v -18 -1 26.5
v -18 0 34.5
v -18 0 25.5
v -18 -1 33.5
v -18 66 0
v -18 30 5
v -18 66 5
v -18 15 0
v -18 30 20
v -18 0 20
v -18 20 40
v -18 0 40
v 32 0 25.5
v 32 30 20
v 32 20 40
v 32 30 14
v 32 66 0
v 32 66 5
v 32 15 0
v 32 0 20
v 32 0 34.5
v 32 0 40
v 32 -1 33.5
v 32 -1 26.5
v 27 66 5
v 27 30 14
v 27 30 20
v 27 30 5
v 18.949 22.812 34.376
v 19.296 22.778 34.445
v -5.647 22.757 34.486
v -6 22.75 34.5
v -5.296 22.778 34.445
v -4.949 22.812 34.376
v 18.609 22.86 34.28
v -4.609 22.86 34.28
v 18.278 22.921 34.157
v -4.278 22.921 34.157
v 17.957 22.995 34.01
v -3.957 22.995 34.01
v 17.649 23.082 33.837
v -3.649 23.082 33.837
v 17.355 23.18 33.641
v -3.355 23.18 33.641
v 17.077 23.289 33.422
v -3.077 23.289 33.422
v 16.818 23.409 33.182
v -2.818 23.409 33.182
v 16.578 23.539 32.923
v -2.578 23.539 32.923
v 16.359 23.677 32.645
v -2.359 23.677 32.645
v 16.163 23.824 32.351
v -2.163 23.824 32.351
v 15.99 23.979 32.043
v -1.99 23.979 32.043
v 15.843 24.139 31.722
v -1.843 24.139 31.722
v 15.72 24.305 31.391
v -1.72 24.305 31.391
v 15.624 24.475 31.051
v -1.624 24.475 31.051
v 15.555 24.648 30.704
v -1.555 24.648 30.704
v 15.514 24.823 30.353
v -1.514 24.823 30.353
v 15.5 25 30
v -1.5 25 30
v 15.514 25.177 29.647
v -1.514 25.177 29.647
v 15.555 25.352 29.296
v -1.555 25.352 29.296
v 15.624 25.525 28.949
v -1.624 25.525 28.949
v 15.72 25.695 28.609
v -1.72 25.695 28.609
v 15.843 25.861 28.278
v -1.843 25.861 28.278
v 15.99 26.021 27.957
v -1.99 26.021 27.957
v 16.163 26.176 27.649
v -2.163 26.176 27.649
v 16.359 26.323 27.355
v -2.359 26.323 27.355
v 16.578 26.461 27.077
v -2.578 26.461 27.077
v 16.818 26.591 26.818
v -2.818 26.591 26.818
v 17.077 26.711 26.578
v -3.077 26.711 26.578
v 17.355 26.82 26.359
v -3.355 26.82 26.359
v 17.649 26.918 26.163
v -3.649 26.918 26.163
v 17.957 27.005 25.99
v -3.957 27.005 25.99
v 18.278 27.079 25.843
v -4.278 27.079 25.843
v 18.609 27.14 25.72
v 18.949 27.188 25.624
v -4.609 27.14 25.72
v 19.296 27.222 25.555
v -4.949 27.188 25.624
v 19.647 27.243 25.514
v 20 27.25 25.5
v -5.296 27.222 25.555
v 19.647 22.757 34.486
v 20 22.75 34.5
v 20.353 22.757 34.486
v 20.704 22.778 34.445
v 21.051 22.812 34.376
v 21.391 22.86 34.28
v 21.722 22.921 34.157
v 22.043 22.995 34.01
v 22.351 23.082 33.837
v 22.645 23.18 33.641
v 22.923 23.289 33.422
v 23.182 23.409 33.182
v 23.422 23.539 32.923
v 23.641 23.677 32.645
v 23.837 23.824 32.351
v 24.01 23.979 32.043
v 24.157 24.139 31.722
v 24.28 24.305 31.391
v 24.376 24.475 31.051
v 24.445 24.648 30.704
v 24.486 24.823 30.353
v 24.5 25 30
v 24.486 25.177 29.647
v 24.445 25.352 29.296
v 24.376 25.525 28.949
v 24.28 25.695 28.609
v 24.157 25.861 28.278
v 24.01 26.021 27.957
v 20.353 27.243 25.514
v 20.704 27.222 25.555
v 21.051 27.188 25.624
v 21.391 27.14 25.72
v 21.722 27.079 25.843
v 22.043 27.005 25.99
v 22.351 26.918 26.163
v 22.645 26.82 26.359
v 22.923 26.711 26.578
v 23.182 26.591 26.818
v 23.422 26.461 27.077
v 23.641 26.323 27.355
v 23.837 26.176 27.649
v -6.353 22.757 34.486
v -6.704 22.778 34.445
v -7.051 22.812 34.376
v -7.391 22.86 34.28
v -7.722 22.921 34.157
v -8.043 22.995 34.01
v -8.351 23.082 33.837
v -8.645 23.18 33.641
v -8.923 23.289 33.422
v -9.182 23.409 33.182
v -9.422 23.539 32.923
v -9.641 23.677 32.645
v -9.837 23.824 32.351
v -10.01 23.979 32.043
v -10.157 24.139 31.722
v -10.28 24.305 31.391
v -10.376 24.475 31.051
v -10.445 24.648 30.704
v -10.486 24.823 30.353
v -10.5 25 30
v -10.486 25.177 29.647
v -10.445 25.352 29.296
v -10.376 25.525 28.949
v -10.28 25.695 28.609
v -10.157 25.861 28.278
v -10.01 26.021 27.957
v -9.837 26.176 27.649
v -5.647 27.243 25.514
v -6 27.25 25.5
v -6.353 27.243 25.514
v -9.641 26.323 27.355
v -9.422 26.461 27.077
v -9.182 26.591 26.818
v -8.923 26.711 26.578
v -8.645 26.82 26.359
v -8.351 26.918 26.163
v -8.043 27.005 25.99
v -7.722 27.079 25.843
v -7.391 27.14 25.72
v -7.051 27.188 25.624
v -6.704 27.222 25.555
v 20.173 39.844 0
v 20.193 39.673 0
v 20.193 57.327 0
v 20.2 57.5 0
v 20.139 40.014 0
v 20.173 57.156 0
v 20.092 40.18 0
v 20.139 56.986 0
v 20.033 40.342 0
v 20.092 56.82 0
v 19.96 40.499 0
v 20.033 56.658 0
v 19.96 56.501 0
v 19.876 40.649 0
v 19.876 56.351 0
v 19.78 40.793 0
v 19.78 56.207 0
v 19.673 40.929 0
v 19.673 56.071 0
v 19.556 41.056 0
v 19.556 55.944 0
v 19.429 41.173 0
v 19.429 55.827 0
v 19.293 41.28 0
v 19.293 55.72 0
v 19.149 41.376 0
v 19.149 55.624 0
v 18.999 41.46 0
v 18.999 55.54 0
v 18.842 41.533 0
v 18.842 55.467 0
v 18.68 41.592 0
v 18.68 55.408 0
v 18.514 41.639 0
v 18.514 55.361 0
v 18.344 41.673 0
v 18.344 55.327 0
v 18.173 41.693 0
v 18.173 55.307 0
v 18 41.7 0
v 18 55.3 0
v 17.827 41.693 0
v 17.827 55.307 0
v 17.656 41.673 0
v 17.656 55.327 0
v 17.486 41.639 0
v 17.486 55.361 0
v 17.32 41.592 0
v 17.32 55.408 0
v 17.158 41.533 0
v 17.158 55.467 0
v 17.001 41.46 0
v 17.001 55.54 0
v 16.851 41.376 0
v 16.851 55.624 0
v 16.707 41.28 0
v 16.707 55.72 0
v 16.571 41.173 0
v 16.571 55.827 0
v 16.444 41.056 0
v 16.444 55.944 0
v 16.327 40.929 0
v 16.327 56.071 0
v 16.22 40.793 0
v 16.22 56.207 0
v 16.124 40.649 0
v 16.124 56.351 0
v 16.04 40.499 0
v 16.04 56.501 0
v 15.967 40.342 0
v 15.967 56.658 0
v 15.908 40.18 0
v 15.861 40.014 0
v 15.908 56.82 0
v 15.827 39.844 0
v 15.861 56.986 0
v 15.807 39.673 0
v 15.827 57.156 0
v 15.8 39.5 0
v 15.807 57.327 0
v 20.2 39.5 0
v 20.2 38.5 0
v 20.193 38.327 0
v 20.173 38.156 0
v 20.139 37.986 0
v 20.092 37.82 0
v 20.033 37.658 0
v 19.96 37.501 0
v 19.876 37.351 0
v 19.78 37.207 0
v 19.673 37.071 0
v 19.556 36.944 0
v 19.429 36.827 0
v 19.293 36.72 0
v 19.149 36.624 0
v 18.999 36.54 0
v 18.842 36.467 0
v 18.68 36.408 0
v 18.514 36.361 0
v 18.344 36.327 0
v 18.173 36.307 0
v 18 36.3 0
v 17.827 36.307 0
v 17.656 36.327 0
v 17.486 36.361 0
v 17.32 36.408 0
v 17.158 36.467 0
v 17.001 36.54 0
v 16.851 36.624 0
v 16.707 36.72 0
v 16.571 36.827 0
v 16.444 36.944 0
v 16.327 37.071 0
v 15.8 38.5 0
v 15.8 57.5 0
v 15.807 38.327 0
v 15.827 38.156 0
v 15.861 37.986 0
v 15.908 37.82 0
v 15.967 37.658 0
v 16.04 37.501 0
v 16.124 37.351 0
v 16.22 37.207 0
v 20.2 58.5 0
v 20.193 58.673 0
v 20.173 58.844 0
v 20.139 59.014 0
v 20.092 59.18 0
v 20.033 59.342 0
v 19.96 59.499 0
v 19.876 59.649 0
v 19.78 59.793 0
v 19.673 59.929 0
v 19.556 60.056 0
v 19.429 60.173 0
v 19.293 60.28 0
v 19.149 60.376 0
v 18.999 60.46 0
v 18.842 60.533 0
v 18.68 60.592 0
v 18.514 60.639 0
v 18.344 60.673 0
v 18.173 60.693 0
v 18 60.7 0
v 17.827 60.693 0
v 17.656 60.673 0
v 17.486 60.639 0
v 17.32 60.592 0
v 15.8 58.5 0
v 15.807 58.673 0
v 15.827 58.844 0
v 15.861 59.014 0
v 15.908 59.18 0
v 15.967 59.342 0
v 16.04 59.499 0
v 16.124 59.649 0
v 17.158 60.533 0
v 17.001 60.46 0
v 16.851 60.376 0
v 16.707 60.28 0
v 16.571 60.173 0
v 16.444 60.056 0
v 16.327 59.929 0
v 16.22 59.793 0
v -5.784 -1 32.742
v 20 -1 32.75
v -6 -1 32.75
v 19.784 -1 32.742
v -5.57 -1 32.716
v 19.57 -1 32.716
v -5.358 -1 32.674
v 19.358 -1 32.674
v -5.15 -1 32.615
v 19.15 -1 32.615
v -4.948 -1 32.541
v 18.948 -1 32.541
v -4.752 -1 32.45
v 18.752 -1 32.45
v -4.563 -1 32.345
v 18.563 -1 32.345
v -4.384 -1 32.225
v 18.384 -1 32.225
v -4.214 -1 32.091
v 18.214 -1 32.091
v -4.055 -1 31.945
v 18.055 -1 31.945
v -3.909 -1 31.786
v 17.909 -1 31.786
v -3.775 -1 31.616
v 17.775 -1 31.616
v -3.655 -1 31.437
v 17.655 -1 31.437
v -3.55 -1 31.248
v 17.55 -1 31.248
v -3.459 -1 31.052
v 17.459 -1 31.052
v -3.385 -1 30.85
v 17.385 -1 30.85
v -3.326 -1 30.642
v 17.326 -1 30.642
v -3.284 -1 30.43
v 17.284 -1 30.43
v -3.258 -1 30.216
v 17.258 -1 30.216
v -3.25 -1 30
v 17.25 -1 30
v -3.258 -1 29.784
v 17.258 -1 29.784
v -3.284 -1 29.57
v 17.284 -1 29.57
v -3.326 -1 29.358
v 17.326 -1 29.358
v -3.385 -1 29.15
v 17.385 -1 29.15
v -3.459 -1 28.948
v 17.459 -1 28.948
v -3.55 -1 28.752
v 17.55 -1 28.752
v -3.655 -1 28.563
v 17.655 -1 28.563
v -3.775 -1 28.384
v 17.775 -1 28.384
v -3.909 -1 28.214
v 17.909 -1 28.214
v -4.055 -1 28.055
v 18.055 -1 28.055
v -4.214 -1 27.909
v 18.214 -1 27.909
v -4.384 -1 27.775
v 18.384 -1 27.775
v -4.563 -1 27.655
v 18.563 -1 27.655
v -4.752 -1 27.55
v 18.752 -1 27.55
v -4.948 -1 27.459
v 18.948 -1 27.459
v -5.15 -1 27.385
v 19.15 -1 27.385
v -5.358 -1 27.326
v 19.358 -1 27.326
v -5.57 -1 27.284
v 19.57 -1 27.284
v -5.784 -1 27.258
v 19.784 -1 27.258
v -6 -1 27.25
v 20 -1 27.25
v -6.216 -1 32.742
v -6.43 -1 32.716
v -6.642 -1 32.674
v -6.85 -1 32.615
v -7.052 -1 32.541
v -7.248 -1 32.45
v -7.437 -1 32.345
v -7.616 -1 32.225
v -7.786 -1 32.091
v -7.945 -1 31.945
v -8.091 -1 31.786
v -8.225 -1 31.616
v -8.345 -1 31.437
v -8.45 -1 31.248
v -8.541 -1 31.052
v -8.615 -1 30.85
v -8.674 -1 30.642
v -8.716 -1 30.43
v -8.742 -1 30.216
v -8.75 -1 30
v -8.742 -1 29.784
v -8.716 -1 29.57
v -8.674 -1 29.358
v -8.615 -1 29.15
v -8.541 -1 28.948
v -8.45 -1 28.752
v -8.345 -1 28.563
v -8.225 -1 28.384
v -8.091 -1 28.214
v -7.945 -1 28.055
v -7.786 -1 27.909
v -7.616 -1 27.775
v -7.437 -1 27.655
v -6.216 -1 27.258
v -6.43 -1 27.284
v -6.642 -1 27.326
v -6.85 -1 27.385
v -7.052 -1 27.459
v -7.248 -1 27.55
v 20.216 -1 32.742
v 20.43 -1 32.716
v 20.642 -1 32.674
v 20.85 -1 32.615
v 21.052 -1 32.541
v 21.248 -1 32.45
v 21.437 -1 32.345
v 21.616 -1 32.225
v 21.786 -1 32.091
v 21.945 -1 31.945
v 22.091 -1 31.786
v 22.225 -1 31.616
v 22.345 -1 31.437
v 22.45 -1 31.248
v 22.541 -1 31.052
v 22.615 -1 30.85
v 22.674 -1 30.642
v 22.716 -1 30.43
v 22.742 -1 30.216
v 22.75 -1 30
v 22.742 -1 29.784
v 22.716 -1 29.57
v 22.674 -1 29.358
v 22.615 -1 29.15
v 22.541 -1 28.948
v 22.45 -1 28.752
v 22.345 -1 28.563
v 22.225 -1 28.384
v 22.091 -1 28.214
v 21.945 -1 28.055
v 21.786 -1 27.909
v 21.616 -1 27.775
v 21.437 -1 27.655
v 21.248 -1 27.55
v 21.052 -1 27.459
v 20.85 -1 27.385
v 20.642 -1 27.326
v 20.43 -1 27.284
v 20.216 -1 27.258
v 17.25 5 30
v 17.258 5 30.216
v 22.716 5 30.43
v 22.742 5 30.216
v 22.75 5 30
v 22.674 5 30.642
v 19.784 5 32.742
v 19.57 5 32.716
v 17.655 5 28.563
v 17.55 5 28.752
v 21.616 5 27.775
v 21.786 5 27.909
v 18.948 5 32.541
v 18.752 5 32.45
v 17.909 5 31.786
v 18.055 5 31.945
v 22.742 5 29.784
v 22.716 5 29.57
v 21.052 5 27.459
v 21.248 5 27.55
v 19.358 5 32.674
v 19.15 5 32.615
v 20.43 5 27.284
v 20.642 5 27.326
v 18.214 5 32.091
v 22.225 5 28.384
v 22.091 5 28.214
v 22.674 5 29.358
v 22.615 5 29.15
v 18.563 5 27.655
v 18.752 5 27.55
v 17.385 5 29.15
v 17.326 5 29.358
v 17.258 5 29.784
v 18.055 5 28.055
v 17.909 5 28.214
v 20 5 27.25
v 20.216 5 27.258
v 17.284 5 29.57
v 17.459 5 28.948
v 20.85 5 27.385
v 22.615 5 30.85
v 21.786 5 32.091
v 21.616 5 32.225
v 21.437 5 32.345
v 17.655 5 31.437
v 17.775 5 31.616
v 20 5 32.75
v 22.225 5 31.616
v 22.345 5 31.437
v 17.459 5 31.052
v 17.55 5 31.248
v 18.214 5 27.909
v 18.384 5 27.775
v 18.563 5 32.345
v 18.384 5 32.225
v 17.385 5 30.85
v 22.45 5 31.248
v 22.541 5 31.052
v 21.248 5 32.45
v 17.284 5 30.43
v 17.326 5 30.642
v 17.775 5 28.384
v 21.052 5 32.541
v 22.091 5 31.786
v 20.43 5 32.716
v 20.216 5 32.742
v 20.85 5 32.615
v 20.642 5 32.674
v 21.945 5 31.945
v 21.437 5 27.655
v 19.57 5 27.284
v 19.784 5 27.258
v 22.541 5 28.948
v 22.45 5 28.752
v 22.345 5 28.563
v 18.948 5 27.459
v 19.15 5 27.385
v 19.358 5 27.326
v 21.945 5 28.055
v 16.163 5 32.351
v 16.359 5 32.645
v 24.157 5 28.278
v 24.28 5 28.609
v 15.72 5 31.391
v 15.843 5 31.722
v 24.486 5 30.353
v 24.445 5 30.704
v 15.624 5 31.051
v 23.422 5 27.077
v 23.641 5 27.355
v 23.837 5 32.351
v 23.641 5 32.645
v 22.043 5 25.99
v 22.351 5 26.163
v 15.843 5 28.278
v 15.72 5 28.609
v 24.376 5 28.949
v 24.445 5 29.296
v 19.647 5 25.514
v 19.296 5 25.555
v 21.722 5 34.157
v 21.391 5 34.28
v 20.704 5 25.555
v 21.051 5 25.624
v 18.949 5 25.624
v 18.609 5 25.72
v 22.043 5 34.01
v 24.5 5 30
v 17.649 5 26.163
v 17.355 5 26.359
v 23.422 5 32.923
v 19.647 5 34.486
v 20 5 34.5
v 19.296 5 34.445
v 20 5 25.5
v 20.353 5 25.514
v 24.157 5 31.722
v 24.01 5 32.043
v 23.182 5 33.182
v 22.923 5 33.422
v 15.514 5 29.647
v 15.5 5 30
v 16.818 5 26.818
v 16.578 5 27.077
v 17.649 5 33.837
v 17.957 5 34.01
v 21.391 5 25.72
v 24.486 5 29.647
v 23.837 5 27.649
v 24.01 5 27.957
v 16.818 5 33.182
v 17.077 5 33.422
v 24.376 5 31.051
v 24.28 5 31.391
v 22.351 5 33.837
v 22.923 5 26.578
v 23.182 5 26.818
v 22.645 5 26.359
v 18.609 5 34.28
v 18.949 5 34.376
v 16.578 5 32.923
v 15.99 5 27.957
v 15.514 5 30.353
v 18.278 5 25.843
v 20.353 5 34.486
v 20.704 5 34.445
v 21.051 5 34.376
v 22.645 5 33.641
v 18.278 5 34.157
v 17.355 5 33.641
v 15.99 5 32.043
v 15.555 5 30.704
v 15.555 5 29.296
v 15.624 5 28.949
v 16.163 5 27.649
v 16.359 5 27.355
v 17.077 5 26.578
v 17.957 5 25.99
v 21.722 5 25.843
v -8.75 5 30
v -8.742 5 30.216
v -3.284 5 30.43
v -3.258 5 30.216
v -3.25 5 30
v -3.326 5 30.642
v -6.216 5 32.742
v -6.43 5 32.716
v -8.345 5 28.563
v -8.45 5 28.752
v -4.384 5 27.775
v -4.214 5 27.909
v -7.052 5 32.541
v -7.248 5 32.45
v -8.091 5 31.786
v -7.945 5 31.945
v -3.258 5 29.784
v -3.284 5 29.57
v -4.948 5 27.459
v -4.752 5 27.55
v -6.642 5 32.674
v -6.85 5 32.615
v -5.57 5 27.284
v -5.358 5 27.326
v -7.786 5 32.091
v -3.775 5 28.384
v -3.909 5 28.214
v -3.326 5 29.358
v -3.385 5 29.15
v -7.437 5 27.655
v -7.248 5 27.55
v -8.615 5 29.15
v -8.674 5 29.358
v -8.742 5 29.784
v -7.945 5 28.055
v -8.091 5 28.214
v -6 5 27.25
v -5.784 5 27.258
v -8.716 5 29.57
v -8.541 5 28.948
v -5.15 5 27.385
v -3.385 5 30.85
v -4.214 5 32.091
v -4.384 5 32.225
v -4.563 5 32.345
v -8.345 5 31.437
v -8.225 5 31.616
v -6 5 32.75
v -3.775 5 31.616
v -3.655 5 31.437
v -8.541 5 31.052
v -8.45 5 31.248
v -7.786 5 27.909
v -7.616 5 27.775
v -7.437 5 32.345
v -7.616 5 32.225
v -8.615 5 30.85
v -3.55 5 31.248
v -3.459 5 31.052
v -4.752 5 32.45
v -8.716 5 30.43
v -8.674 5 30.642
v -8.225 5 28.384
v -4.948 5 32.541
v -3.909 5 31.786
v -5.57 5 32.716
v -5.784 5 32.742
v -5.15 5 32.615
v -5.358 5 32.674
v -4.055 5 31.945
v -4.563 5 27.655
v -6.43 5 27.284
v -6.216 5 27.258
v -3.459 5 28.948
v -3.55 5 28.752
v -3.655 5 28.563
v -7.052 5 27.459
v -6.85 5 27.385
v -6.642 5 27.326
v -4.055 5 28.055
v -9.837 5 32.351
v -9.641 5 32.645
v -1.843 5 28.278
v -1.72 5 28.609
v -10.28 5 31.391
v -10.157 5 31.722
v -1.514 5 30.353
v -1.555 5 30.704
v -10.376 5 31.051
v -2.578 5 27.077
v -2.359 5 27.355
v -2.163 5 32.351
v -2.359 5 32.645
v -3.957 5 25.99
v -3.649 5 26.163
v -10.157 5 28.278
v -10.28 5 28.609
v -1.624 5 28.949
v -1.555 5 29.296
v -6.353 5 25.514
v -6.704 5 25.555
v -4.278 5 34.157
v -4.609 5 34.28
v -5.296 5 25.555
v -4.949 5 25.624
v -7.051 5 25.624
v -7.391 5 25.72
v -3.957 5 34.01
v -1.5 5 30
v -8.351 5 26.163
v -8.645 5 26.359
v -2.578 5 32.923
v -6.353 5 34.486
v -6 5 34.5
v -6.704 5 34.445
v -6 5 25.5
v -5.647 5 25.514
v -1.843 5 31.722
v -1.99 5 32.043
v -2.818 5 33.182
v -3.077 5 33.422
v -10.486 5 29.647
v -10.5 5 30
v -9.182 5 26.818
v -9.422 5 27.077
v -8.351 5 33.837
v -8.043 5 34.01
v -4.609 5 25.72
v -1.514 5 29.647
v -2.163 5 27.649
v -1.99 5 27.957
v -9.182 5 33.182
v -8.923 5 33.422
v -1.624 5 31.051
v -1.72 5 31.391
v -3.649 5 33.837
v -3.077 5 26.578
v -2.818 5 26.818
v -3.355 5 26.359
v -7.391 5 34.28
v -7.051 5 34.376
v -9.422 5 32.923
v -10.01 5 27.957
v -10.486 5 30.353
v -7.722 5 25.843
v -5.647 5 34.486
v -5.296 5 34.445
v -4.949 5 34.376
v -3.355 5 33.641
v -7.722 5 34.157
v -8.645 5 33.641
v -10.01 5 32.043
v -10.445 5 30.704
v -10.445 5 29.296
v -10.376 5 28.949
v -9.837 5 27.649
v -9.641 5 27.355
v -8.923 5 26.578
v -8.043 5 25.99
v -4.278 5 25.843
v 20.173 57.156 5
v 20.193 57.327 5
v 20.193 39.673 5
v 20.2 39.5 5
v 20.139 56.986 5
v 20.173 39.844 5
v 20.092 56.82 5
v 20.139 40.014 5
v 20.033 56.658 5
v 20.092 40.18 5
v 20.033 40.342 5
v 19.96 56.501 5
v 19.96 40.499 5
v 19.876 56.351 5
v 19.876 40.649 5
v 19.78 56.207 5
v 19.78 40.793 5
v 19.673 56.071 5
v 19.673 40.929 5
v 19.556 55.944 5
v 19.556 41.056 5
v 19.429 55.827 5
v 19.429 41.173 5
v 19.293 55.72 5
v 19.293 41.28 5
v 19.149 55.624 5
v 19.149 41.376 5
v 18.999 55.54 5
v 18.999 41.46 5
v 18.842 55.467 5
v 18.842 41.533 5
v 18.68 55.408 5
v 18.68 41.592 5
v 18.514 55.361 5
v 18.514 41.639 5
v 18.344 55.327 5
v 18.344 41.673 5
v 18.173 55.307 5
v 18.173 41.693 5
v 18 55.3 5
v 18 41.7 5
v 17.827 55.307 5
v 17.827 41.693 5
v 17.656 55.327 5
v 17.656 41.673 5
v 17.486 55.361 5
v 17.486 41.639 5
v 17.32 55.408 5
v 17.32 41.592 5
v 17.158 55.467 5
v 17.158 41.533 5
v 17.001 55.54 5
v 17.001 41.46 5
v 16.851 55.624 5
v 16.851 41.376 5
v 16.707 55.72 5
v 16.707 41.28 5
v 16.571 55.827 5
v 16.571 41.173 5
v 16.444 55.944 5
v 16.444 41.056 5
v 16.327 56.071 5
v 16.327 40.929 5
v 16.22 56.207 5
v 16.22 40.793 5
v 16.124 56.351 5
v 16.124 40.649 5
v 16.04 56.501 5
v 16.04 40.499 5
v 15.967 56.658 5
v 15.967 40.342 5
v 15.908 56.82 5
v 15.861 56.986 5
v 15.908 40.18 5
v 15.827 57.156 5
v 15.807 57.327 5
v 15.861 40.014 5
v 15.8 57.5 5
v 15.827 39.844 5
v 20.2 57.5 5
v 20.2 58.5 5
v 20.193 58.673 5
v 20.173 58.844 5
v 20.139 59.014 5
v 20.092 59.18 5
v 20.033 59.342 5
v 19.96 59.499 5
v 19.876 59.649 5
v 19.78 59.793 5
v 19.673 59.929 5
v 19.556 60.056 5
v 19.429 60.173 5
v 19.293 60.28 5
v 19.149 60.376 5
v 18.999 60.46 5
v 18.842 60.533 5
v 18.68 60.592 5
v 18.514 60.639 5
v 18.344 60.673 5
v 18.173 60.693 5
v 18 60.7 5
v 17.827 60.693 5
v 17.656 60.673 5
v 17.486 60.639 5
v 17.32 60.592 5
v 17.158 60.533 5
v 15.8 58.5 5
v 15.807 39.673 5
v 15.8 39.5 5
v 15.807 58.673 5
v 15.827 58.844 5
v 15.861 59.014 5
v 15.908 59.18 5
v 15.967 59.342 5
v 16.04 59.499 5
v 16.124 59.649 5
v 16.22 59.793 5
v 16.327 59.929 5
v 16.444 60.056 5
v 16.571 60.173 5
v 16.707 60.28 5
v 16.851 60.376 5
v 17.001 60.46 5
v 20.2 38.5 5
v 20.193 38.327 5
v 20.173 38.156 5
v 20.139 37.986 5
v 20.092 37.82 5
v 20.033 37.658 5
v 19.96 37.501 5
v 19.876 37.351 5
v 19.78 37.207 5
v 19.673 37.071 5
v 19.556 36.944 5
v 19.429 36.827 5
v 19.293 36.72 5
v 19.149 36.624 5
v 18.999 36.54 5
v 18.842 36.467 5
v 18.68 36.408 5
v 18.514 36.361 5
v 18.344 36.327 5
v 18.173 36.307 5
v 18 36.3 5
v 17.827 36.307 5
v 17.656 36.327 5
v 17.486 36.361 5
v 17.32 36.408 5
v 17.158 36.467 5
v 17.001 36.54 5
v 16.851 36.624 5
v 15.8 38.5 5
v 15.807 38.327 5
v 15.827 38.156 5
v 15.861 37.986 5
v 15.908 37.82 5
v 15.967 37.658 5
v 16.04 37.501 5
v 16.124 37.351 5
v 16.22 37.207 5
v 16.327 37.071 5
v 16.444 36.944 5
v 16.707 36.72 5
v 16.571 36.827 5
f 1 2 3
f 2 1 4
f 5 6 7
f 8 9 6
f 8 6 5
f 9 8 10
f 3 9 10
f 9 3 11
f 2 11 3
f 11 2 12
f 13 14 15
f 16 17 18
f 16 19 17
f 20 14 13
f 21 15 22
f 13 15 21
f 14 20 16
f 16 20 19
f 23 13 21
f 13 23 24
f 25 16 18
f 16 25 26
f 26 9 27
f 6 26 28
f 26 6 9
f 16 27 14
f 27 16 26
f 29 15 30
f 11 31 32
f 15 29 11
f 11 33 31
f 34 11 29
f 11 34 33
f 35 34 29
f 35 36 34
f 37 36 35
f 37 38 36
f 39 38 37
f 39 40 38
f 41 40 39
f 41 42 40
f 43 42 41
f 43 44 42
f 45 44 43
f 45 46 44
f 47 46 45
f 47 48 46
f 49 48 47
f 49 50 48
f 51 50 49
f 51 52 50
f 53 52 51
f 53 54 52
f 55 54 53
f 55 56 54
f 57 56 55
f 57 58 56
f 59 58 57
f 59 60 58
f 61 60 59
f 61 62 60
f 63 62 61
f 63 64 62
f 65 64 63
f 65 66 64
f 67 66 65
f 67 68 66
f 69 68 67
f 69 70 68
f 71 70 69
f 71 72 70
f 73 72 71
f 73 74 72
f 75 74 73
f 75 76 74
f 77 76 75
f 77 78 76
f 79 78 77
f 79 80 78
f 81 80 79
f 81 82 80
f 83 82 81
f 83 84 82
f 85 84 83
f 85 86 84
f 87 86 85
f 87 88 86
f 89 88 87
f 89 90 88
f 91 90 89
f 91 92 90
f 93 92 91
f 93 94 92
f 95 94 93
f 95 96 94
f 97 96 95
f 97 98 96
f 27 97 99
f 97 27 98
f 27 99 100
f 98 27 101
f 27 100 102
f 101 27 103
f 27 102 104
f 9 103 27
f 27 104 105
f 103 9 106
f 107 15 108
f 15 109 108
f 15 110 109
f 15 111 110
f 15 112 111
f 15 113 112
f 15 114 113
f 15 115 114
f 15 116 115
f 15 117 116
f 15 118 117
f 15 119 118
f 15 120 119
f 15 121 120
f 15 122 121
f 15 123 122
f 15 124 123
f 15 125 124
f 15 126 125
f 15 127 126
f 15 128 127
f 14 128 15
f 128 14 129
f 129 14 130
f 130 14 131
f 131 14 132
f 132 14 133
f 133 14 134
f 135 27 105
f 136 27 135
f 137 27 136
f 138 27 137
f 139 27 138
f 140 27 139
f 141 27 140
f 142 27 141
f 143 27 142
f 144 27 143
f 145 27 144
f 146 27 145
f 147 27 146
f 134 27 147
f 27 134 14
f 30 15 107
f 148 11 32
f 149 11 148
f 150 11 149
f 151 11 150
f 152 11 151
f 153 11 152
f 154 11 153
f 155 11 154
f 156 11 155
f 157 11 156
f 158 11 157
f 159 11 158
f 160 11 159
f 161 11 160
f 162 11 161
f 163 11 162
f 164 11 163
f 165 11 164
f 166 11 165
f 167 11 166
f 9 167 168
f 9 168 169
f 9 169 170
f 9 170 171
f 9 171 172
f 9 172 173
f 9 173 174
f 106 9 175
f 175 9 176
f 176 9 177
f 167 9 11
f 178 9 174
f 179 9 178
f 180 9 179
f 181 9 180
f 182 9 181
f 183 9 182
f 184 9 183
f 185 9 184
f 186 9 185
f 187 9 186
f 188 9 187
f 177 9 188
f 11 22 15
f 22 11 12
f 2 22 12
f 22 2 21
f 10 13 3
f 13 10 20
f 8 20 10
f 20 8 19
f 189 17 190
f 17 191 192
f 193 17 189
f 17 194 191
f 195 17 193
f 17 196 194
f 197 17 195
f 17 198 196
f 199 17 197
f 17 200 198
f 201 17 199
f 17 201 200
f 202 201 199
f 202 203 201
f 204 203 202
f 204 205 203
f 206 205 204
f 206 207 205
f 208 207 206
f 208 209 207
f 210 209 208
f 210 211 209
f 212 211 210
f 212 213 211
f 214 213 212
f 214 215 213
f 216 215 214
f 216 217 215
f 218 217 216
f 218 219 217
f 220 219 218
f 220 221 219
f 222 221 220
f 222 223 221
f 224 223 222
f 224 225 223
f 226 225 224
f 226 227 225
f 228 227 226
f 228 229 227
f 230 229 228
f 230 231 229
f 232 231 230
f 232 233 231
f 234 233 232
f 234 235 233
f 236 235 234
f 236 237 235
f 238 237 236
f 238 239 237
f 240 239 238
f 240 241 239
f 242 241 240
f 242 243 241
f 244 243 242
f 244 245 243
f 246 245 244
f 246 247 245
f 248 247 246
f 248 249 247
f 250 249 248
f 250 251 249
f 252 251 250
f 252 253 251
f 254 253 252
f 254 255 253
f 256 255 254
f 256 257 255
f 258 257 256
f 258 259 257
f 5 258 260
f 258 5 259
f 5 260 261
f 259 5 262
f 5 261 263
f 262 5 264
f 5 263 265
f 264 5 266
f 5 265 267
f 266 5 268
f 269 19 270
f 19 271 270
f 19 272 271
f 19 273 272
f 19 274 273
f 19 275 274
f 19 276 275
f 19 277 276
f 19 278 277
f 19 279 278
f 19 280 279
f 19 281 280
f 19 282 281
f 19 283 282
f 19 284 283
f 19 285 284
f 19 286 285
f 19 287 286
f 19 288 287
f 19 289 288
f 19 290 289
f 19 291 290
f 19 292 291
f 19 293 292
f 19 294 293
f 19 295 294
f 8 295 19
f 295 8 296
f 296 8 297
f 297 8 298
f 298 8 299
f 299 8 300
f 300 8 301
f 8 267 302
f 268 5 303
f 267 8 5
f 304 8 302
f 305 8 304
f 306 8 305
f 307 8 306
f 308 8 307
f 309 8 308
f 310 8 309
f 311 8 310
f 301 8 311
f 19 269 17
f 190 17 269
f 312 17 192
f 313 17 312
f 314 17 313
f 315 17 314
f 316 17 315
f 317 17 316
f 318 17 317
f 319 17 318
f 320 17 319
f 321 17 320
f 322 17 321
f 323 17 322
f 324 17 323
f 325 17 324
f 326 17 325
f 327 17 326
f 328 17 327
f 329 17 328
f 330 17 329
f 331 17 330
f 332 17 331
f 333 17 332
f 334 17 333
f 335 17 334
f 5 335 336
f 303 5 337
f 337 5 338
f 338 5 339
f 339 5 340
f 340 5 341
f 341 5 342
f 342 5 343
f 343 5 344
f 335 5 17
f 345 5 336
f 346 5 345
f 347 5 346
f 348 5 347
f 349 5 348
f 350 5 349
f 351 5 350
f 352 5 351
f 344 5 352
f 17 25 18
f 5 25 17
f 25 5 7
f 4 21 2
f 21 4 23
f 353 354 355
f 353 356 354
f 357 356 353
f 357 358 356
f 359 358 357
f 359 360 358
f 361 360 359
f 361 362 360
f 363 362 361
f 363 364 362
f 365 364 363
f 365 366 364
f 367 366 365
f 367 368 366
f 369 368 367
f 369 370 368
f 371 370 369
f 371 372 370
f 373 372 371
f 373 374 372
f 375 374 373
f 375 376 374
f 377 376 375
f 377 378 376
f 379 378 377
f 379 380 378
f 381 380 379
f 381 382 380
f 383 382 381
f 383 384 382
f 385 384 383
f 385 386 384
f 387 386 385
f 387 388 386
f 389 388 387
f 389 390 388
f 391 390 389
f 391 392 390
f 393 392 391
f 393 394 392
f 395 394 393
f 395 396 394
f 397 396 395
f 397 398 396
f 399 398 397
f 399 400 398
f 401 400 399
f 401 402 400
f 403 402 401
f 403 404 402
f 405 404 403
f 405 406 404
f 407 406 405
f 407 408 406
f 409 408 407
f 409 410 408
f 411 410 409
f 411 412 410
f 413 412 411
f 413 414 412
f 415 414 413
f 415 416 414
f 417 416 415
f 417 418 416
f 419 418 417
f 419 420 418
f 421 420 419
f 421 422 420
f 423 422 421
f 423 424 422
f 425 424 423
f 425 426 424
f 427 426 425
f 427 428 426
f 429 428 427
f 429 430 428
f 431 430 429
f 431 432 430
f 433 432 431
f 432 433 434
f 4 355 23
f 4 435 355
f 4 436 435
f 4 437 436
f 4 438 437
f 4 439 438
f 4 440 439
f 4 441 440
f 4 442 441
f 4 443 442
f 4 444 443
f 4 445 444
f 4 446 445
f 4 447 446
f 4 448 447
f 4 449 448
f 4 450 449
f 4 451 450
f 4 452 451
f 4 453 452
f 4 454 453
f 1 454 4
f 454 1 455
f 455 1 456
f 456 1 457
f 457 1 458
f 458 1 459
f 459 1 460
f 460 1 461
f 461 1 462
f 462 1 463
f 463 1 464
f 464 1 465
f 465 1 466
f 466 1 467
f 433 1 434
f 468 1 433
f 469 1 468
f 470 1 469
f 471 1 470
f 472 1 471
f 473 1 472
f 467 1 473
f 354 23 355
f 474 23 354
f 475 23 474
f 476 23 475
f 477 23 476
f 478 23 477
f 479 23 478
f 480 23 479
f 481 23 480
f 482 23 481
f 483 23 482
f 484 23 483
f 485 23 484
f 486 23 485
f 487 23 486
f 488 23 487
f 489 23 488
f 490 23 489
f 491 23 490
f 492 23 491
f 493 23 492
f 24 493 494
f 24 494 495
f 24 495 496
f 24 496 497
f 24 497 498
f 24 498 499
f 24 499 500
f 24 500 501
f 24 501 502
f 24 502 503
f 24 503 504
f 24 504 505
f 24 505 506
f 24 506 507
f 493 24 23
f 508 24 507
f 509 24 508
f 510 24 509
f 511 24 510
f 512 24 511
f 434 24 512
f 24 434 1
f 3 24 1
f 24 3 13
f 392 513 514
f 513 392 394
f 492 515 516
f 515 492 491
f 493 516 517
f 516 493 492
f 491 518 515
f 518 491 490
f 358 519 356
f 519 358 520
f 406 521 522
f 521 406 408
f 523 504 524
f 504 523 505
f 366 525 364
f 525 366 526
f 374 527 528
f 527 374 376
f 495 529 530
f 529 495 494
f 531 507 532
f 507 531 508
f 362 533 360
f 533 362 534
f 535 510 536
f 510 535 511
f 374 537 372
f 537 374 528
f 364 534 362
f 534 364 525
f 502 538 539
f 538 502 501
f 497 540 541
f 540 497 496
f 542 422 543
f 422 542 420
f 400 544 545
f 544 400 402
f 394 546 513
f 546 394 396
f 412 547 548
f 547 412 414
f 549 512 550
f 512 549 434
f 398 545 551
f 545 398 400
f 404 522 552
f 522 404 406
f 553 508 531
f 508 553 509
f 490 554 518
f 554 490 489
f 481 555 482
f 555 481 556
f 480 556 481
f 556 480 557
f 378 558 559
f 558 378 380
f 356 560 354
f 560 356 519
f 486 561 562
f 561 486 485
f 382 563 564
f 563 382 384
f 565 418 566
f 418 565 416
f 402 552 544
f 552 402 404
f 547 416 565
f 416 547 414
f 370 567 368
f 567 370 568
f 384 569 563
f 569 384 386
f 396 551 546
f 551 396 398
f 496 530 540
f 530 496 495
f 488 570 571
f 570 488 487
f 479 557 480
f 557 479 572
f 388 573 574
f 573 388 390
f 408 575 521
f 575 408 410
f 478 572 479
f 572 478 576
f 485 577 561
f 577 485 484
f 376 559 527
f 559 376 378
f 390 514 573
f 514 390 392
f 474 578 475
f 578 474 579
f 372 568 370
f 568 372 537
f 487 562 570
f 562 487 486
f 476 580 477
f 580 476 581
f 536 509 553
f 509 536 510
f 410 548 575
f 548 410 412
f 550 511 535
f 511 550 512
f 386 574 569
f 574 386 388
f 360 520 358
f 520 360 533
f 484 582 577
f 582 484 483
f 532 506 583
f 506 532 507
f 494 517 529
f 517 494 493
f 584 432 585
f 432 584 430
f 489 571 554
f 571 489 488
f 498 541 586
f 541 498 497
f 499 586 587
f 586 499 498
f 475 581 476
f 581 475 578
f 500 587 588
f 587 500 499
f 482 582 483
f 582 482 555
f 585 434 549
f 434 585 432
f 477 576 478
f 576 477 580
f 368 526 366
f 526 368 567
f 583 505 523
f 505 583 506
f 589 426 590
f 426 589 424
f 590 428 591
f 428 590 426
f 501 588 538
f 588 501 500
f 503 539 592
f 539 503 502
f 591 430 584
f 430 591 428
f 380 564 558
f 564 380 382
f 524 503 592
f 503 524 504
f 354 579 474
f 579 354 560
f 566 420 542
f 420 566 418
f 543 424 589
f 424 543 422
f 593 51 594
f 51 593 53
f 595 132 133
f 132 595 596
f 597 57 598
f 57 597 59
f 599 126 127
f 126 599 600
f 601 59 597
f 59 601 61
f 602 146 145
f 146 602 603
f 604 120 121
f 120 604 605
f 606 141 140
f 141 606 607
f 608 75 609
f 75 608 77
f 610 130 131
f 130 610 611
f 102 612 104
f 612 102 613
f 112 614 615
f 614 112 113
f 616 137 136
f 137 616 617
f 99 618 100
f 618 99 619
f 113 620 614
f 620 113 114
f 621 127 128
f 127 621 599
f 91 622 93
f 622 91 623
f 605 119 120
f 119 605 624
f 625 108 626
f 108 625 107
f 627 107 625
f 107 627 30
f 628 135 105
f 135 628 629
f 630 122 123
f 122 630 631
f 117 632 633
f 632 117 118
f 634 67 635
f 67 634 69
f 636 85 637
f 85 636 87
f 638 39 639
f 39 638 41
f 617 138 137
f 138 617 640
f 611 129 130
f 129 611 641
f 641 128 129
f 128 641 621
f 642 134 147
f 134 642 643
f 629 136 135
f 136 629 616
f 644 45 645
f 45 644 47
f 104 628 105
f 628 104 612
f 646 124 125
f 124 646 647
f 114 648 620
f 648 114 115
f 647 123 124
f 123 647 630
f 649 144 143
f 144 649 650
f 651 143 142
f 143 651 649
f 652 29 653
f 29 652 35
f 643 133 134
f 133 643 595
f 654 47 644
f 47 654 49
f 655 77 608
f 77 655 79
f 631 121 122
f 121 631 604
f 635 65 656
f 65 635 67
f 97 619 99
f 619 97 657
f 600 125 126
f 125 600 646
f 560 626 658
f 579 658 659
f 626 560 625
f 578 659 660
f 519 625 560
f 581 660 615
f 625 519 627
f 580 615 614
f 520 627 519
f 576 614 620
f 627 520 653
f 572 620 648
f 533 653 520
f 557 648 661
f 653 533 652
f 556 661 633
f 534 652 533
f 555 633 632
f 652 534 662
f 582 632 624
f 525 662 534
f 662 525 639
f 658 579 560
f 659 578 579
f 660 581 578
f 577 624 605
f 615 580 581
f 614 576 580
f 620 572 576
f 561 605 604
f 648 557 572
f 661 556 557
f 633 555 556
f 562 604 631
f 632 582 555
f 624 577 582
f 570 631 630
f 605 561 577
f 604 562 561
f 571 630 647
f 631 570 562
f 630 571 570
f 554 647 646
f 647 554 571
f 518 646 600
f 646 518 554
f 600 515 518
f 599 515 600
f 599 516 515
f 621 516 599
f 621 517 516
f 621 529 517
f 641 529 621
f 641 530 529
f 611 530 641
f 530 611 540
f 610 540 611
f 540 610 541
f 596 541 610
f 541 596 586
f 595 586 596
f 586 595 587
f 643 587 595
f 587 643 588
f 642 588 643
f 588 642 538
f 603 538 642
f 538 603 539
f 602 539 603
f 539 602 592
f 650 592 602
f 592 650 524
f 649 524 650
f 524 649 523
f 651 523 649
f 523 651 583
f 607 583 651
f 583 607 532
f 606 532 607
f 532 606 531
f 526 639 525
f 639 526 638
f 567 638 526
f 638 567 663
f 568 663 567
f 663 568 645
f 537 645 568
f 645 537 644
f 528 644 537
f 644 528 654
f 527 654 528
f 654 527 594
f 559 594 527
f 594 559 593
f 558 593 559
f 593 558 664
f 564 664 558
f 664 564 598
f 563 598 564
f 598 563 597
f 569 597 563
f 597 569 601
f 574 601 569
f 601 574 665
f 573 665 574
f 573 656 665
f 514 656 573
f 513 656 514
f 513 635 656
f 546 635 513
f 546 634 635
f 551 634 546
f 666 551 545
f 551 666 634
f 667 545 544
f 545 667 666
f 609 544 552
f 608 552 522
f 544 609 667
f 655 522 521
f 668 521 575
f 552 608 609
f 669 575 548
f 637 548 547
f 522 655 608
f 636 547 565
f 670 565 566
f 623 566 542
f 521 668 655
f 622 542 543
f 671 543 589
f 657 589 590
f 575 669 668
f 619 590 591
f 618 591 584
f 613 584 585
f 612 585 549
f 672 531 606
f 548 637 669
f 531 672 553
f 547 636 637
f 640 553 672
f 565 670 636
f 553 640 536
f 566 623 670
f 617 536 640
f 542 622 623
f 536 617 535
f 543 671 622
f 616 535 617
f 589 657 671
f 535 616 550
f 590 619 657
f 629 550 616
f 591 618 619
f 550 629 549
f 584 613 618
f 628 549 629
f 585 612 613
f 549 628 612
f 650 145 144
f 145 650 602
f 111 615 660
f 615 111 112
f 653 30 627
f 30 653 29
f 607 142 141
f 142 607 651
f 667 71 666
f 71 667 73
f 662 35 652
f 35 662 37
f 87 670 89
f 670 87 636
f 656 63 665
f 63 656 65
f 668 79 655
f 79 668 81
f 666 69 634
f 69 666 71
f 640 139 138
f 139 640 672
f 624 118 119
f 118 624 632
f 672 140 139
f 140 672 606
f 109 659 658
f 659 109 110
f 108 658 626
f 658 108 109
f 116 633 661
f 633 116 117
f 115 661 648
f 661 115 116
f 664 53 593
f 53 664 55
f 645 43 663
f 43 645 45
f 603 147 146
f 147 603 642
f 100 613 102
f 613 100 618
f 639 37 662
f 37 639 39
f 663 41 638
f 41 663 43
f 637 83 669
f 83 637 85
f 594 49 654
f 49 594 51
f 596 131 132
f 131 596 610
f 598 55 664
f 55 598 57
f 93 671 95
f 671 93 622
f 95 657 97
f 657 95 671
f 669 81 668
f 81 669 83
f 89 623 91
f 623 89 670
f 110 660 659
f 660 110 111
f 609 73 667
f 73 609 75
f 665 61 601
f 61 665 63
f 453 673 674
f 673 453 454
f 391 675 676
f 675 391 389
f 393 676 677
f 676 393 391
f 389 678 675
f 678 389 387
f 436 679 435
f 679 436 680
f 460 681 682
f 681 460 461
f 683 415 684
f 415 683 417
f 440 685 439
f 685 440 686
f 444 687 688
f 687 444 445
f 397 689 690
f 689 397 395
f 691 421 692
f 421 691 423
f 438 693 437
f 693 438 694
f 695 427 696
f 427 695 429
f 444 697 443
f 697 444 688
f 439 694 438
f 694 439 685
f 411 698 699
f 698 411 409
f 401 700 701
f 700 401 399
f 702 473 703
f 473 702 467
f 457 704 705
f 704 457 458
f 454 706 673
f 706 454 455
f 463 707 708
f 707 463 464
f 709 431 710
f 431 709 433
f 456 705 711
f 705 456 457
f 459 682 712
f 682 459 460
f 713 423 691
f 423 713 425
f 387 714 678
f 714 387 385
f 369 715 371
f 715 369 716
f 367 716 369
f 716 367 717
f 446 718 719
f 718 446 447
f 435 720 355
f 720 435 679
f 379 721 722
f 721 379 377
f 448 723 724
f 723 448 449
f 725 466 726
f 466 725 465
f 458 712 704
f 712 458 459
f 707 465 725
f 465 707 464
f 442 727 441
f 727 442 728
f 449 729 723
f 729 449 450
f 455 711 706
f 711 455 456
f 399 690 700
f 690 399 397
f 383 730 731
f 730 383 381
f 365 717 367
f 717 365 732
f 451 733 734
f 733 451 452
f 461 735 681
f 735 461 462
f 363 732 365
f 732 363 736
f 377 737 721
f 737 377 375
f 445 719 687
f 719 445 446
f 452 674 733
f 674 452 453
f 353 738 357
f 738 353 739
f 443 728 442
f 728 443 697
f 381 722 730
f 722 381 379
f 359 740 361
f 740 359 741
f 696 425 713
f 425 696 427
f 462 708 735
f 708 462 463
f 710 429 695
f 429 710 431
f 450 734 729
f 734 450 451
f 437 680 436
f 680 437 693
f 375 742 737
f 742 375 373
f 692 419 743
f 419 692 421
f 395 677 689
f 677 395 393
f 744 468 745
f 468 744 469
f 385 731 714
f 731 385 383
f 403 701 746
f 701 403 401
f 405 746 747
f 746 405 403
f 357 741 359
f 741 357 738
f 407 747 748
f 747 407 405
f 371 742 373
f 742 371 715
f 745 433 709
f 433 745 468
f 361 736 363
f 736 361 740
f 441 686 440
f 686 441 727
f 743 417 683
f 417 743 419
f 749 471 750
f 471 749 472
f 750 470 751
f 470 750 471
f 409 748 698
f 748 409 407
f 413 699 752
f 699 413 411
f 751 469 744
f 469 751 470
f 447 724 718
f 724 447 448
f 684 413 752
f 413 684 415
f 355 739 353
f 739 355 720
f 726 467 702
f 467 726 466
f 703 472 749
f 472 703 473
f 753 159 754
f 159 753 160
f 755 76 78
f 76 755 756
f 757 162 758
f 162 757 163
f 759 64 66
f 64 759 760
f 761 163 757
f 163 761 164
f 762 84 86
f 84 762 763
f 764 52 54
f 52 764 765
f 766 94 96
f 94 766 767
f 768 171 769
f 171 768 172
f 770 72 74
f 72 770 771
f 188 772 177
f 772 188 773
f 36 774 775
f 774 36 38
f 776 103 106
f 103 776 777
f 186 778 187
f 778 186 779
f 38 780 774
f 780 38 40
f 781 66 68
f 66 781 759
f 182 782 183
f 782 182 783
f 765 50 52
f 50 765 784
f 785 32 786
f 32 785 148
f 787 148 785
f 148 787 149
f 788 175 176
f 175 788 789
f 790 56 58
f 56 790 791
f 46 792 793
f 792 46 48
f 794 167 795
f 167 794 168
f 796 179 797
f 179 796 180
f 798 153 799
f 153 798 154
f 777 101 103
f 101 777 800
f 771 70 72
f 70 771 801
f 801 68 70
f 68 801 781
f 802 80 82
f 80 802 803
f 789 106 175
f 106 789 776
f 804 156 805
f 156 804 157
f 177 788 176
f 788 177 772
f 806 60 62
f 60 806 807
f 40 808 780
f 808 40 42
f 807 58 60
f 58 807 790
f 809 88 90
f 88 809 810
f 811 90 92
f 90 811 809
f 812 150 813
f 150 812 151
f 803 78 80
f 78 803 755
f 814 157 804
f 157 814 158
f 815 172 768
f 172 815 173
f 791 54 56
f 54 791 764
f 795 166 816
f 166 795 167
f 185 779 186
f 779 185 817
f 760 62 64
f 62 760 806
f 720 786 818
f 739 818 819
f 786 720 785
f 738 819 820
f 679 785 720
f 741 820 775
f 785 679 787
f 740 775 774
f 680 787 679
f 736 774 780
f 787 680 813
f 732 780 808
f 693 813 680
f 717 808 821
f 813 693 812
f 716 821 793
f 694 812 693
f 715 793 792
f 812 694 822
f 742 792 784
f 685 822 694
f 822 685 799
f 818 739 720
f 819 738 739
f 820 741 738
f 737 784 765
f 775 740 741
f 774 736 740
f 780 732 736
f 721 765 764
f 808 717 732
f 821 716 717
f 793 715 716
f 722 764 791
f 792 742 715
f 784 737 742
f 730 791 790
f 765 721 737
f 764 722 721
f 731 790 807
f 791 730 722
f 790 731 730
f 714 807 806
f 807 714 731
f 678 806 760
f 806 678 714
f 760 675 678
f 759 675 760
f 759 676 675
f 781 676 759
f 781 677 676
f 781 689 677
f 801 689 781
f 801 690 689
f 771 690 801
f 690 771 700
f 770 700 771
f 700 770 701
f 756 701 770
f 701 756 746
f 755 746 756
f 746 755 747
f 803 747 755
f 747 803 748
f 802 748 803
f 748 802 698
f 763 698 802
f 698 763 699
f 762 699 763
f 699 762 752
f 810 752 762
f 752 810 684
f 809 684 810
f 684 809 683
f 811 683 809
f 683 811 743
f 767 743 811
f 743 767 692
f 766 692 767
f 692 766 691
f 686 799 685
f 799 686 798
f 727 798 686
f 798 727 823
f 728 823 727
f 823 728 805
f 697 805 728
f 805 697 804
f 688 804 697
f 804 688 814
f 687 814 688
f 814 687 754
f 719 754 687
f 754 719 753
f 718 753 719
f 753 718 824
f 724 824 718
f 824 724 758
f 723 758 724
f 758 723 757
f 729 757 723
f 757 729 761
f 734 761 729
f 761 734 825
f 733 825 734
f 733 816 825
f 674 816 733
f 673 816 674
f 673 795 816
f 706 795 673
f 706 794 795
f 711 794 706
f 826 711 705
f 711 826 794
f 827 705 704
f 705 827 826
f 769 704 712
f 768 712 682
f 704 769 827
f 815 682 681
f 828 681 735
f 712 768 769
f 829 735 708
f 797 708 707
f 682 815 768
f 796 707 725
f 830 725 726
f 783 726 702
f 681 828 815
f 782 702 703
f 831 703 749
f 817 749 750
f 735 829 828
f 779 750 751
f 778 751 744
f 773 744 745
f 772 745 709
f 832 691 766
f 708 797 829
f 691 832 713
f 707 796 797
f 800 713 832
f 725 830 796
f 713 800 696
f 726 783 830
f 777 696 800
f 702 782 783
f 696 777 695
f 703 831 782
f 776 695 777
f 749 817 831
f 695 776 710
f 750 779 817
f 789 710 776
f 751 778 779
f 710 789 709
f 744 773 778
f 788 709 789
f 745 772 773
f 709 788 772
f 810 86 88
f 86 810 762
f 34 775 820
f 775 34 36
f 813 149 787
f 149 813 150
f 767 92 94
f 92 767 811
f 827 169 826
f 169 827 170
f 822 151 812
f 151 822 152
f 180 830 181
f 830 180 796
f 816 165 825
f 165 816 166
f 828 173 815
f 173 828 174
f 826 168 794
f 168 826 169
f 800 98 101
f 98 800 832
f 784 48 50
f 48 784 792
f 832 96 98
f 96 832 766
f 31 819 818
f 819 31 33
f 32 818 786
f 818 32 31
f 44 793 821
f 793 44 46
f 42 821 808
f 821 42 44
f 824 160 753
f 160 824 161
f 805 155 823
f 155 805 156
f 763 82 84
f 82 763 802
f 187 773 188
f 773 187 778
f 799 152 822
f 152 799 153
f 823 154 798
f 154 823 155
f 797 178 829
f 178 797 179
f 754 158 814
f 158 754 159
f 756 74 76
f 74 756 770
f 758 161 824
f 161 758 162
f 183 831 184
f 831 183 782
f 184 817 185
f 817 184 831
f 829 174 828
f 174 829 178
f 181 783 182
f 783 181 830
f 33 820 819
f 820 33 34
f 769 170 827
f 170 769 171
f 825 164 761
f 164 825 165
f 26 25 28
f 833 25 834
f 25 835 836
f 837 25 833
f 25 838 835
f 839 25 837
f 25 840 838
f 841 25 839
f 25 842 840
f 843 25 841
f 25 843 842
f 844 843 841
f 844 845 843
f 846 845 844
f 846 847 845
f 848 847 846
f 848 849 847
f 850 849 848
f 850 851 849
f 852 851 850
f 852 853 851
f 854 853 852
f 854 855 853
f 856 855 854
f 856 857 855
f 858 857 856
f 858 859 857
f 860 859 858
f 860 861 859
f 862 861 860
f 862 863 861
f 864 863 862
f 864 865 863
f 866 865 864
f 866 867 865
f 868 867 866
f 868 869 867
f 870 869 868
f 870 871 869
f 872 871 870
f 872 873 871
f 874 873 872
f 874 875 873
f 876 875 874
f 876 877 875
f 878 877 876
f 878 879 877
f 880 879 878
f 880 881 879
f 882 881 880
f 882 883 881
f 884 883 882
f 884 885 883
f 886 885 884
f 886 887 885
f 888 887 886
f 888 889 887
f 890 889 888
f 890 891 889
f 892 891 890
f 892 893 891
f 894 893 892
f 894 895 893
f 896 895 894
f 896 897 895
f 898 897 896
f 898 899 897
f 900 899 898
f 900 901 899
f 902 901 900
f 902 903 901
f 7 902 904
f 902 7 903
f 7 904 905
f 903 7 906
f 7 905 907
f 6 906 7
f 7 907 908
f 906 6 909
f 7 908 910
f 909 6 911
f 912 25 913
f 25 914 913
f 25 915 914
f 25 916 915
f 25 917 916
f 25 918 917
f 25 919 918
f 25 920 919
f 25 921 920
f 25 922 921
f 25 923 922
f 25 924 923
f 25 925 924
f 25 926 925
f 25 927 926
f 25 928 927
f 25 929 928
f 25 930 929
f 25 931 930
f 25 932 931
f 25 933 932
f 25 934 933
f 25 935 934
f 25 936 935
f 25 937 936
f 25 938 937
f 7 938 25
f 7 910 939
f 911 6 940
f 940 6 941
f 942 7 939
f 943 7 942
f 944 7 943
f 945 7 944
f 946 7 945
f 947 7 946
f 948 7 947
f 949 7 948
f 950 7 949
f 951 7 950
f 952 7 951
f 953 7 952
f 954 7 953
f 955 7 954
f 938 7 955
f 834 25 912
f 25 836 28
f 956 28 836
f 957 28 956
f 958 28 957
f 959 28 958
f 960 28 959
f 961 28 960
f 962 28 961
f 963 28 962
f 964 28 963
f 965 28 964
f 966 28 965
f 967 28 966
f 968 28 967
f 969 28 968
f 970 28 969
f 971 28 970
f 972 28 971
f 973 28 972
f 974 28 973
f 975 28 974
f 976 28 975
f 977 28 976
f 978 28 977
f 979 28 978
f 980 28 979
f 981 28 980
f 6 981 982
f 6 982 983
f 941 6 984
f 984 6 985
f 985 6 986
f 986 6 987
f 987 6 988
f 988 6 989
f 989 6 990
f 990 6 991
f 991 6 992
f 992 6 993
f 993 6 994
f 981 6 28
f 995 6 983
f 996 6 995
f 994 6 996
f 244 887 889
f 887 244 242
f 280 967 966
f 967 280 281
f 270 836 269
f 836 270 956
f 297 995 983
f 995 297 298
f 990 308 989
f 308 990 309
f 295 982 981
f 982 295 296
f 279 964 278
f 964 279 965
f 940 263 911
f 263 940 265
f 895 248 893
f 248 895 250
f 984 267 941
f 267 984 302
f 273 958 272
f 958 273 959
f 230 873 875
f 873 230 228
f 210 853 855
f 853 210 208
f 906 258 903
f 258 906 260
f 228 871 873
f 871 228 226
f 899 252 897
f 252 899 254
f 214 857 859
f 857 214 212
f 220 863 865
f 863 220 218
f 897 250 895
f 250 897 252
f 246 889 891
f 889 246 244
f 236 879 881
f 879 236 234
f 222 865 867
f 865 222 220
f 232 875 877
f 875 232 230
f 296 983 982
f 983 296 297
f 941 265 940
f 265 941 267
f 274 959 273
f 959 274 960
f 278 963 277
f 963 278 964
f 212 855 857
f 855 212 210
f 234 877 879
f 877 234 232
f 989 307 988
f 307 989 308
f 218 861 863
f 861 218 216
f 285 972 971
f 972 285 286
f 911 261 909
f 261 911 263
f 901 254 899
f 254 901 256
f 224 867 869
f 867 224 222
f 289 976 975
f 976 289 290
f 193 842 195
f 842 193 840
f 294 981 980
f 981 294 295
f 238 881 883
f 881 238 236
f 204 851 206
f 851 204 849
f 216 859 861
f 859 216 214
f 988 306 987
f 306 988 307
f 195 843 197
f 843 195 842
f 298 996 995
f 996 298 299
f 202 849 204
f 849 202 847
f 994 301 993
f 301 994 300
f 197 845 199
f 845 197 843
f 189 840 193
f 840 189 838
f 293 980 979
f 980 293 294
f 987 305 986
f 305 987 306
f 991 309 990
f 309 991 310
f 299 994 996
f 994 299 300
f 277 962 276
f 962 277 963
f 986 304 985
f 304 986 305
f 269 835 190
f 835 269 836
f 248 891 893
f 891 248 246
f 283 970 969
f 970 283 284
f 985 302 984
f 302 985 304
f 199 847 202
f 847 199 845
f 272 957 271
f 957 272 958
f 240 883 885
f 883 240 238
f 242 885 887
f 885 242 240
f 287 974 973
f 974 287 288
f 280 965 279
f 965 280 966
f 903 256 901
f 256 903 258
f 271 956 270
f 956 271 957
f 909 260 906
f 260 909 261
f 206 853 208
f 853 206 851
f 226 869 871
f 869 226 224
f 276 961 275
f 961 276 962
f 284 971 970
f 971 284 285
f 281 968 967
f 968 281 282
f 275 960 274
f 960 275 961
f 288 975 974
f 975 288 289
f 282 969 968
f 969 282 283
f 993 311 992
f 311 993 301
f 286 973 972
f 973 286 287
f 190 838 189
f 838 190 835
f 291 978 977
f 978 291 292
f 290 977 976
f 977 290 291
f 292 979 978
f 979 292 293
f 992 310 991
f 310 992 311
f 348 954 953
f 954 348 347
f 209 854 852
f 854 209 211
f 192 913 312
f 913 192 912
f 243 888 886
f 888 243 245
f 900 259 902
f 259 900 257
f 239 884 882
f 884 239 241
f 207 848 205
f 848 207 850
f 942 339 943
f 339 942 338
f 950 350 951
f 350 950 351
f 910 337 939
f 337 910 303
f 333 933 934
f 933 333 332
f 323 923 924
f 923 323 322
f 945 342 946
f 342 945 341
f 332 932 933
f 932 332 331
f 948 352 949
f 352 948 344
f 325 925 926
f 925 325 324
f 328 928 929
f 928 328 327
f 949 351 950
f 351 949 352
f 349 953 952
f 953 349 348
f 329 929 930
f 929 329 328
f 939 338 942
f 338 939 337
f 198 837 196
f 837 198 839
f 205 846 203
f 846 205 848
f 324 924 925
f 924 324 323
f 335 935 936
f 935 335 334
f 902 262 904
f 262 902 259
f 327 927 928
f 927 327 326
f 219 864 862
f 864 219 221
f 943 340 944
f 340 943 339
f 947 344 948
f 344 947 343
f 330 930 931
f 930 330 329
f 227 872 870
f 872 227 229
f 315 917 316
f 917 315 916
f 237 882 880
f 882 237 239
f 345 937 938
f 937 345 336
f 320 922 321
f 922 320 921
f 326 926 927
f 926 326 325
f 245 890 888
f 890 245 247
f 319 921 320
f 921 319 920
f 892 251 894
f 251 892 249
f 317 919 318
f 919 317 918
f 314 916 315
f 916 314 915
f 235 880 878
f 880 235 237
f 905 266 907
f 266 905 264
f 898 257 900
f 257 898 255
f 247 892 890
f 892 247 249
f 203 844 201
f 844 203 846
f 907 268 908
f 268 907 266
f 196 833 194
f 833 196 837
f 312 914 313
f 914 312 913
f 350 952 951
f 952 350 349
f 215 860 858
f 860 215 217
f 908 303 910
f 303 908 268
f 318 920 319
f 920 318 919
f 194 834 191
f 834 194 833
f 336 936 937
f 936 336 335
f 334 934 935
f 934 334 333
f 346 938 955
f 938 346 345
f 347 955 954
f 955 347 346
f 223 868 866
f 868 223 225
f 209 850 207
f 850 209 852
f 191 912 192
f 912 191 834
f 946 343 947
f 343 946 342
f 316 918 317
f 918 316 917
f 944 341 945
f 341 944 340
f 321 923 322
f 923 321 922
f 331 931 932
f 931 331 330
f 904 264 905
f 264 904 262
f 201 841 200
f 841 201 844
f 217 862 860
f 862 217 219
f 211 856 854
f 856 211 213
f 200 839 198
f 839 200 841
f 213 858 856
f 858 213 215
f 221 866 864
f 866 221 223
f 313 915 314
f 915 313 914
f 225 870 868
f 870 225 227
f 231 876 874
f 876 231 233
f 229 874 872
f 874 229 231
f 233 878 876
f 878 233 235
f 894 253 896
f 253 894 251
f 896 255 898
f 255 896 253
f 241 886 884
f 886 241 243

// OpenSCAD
$fn=80;

ht = 30;

% old();
new();


module new() {
   difference() {
      union() {
         translate([-18,0,0]) rotate([90,0,90])
            linear_extrude(height=50)
            polygon(points=[[0,20],[0,40],[20,40],[ht,20],[ht,14],[ht+36,5],[ht+36,0],[15,0]]);
         /* angled bit to fit in v-slot */
         translate([-18,0,25.5]) rotate([0,-90,180])
            linear_extrude(height=50)
            polygon(points=[[-0.1,0],[0,0],[1,1],[8,1],[9,0],[9,-0.1]]);
      }

      // translate([18,28,-0.5]) cylinder(d=4.4,h=10);
      translate([-18.1,ht,5]) cube([45.1,50,30]);
      hull() {
         translate([18,ht+8.5,-0.5]) cylinder(d=4.4,h=20);
         translate([18,ht+9.5,-0.5]) cylinder(d=4.4,h=20);
      }
      hull() {
         translate([18,ht+27.5,-0.5]) cylinder(d=4.4,h=20);
         translate([18,ht+28.5,-0.5]) cylinder(d=4.4,h=20);
      }

      /* TODO: MAKE SURE HOLES ARE CORRECT DEPTH. */
      translate([20,15,30]) rotate([90,0,0]) {
         /* bolt holes */
         translate([0,0,14-4.8]) cylinder(h=15,d=5.5);

         /* cap holes (with a little gap to allow bridging */
         translate([0,0,-20]) cylinder(h=30,d=9);
      }
      translate([-6,15,30]) rotate([90,0,0]) {
         /* bolt holes */
         translate([0,0,14-4.8]) cylinder(h=15,d=5.5);
   
         /* cap holes (with a little gap to allow bridging */
         translate([0,0,-20]) cylinder(h=30,d=9);
      }
   }
}

module old() {
   difference() {
      union() {
         translate([-8,0,0]) cube([40,20,20]);
            /* angled bit to fit in v-slot */
         translate([-8,0,5.5]) rotate([0,-90,180])
            linear_extrude(height=40)
            polygon(points=[[-0.1,0],[0,0],[1,1],[8,1],[9,0],[9,-0.1]]);
         translate([-8,0,0]) cube([40, 56,5]);
   
         translate([27,0,0]) rotate([90,0,90]) linear_extrude(height=5) polygon(points=[[20,0], [20,20],[56,5], [56,0]]);
      }

      // translate([18,28,-0.5]) cylinder(d=4.4,h=10);
      translate([18,29,-0.5]) cylinder(d=4.4,h=10);
      translate([18,48,-0.5]) cylinder(d=4.4,h=10);

      /* TODO: MAKE SURE HOLES ARE CORRECT DEPTH. */
      translate([20,15,10]) rotate([90,0,0]) {
         /* bolt holes */
         translate([0,0,14-4.8]) cylinder(h=15,d=5.5);

         /* cap holes (with a little gap to allow bridging */
         translate([0,0,-20]) cylinder(h=30,d=9);
      }
      translate([0,15,10]) rotate([90,0,0]) {
         /* bolt holes */
         translate([0,0,14-4.8]) cylinder(h=15,d=5.5);
   
         /* cap holes (with a little gap to allow bridging */
         translate([0,0,-20]) cylinder(h=30,d=9);
      }
   }
}
